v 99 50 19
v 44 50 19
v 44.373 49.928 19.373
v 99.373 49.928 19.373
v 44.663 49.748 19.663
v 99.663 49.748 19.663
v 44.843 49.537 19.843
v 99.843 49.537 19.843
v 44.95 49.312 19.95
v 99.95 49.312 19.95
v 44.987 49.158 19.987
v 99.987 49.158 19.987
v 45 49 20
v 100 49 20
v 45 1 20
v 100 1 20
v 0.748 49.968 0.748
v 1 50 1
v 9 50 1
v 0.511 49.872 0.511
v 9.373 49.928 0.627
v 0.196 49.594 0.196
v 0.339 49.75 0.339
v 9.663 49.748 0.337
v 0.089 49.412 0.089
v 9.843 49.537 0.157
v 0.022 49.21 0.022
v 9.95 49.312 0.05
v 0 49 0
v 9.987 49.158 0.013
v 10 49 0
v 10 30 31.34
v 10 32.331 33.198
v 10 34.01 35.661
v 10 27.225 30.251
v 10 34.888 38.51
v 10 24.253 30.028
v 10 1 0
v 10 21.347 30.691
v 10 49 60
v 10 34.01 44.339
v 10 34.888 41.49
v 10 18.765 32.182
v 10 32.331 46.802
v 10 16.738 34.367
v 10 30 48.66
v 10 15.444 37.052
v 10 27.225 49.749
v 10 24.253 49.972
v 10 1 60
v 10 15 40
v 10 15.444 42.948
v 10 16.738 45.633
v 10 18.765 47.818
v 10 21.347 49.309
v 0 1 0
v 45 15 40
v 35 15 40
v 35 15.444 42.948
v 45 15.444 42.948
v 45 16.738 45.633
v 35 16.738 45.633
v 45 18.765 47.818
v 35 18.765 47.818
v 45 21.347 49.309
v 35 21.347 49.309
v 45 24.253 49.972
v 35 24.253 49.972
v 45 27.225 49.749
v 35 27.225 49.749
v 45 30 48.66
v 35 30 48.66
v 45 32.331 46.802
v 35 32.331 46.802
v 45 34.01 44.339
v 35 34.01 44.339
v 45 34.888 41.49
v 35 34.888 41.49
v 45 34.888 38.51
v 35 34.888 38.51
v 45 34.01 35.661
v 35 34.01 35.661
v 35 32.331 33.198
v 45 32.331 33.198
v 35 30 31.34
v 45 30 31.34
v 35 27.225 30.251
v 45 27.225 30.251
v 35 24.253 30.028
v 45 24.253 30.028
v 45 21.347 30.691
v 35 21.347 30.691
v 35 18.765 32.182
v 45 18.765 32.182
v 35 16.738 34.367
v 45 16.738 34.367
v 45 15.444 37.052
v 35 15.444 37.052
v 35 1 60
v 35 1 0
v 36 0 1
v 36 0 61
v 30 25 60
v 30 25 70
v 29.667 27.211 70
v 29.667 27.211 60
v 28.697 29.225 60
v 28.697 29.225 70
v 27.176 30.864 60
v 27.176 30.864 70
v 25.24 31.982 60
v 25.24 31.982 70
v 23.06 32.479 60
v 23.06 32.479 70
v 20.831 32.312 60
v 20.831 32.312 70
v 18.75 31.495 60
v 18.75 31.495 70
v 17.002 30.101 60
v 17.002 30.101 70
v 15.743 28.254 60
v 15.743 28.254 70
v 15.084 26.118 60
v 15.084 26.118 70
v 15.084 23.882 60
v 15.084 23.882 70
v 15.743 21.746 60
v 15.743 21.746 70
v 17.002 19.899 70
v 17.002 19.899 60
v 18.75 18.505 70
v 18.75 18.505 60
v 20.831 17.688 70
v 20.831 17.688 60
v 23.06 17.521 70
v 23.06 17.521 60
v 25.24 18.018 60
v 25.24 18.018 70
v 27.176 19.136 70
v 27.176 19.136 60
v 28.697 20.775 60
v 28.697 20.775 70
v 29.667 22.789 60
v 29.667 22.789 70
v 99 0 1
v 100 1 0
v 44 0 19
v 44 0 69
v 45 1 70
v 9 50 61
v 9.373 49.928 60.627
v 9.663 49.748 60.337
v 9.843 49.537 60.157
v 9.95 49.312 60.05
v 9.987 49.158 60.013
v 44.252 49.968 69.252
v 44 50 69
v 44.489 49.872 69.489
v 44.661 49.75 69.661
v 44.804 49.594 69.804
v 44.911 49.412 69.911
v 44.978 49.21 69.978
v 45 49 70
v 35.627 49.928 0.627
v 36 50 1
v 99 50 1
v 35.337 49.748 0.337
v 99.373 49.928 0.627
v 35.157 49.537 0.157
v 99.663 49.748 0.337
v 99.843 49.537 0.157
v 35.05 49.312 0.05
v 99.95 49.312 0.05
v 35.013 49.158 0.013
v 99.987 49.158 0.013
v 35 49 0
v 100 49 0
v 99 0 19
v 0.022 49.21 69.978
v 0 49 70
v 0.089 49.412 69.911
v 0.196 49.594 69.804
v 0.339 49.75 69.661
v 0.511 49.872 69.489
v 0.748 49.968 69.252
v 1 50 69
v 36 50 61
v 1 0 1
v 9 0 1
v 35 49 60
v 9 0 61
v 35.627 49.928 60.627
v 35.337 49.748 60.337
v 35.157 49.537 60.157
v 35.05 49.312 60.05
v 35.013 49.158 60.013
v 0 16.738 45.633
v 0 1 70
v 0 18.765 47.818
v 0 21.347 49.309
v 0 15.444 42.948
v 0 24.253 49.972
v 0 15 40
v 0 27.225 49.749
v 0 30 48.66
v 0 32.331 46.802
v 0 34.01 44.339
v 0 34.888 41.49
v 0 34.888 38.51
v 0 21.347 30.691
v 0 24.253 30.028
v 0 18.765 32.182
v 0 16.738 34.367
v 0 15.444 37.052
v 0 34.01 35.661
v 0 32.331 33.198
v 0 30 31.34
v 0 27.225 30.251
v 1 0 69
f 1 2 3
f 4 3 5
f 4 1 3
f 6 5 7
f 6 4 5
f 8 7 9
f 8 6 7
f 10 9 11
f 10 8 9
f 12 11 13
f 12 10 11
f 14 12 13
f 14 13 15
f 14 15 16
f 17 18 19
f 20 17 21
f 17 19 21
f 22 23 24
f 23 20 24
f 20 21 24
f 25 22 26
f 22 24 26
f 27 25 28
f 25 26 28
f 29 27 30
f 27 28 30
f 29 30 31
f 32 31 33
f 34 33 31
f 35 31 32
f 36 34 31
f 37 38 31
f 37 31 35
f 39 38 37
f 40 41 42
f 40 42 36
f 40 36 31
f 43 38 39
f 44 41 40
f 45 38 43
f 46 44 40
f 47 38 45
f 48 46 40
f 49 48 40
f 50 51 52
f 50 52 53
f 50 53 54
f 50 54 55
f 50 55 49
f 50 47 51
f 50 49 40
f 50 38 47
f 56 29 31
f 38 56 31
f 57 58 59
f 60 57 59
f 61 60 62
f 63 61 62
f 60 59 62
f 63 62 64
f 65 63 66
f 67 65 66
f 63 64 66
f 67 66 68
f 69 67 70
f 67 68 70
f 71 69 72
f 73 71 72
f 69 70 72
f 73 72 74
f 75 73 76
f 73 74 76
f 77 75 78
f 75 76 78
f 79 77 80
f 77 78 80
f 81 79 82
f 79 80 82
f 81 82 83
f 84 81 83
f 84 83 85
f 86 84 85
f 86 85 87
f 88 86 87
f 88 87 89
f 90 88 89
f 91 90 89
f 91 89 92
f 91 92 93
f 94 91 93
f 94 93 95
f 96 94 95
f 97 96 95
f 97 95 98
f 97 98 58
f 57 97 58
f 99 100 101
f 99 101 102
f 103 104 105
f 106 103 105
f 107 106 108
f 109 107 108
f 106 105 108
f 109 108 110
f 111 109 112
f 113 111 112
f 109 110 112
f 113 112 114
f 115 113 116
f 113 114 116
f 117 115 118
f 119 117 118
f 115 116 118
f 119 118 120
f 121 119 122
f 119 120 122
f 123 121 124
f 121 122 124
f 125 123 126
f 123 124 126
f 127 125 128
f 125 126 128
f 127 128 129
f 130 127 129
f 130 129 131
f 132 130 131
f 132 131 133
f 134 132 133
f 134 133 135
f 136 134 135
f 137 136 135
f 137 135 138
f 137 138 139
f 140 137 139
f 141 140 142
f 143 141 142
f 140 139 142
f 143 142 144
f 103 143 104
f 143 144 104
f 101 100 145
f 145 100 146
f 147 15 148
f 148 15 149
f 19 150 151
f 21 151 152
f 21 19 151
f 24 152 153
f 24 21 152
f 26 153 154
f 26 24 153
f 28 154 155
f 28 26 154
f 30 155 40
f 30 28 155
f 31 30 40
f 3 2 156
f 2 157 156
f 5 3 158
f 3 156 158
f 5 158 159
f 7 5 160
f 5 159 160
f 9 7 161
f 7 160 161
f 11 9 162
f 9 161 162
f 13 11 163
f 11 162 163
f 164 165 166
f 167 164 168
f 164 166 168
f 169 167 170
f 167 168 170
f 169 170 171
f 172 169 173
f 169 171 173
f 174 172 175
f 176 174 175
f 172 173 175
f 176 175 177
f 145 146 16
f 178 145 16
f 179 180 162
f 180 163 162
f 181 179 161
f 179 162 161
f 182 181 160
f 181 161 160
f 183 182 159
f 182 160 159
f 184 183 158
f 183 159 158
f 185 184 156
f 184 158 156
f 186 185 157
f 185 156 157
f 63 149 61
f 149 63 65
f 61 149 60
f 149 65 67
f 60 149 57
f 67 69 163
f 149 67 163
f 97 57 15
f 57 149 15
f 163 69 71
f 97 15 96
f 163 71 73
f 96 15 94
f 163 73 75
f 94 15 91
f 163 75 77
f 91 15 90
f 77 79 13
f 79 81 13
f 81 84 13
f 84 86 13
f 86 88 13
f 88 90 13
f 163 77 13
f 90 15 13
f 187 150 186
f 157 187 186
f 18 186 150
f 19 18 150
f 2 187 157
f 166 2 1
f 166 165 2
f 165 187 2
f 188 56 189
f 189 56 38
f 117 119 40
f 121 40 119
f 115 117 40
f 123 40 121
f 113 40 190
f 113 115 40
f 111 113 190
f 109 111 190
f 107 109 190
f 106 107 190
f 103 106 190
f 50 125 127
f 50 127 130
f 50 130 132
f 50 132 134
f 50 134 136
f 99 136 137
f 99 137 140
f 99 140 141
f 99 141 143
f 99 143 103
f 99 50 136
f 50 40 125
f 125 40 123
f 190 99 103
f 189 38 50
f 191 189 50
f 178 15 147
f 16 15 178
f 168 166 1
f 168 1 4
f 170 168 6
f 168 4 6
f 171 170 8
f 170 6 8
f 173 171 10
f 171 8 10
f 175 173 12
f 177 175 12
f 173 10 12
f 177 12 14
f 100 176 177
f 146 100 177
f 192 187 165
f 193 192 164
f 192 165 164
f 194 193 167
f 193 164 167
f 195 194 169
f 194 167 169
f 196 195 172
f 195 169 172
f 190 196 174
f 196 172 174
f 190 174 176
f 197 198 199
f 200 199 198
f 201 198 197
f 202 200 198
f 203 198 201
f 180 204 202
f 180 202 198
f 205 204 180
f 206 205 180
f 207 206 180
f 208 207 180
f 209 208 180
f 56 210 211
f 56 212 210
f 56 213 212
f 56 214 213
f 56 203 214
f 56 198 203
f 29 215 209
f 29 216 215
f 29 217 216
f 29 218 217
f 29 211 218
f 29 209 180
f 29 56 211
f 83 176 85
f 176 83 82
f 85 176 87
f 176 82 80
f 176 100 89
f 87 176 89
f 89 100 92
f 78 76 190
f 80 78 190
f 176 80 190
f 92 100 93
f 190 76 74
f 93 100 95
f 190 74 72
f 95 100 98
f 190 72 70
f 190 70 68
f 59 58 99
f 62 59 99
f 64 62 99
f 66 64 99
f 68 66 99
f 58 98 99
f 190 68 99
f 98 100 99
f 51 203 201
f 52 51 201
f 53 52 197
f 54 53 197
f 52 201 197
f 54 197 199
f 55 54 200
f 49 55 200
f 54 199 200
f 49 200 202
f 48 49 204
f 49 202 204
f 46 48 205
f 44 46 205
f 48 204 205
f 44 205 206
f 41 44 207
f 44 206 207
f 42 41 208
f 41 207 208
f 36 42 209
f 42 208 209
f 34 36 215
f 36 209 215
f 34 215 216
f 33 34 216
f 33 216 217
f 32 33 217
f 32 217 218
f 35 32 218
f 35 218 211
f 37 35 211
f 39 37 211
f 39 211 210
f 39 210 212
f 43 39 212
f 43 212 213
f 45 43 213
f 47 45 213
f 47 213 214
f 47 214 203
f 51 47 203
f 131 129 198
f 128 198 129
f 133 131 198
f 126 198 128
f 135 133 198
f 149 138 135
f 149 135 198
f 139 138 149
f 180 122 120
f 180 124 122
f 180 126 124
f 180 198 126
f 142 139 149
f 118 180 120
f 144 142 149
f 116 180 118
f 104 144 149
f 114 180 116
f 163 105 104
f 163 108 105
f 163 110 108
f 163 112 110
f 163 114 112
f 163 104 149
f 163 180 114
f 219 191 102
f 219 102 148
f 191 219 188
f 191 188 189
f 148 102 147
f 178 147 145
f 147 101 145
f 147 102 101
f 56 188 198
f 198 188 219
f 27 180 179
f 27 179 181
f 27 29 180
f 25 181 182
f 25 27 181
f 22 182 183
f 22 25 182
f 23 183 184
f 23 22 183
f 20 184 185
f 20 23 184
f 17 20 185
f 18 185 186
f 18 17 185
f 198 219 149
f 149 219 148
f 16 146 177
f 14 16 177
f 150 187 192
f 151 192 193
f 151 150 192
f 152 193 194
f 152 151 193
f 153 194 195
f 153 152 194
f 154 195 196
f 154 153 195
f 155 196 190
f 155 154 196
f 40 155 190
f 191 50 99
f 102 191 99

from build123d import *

# Parameters (mm, degrees)
F0_W     = 100
F0_H     = 50
F1_DEPTH = 20
F2_W     = 45
F2_H     = 50
F3_DEPTH = 50
F4_W     = 25
F4_H     = 60
F5_DEPTH = 50.001
F6_R     = 10
F7_DEPTH = 100.001
F8_R     = 7.5
F9_DEPTH = 10
F10_SIZE = 1
F11_R    = 1


with BuildPart() as f1:
    # F0 (on Top) → F1 (new body)
    with BuildSketch(Plane.XY):
        with Locations((50, 25)):
            Rectangle(F0_W, F0_H)
    extrude(amount=F1_DEPTH)

    # F2 (on face) → F3 (join)
    with BuildSketch(Plane.XY.offset(20)):
        with Locations((22.5, 25)):
            Rectangle(F2_W, F2_H)
    extrude(amount=F3_DEPTH)

    # F4 (on face) → F5 (cut, through all)
    with BuildSketch(Plane.XZ):
        with Locations((22.5, 30)):
            Rectangle(F4_W, F4_H)
    extrude(amount=-F5_DEPTH, mode=Mode.SUBTRACT)

    # F6 (on face) → F7 (cut, through all)
    with BuildSketch(Plane(origin=(0, 0, 0), x_dir=(0, -1, 0), z_dir=(-1, 0, 0))):
        with Locations((-25, 40)):
            Circle(F6_R)
    extrude(amount=-F7_DEPTH, mode=Mode.SUBTRACT)

    # F8 (on face) → F9 (cut, through all)
    with BuildSketch(Plane.XY.offset(70)):
        with Locations((22.5, 25)):
            Circle(F8_R)
    extrude(amount=-F9_DEPTH, mode=Mode.SUBTRACT)

    # F10
    f10_edges = [f1.edges().sort_by_distance(p)[0] for p in [
        (5, 0, 0),
        (0, 0, 35),
        (45, 0, 45),
        (22.5, 0, 70),
        (10, 0, 30),
        (22.5, 0, 60),
        (35, 0, 30),
        (67.5, 0, 0),
        (72.5, 0, 20),
        (100, 0, 10),
    ]]
    chamfer(f10_edges, length=F10_SIZE)

    # F11
    f11_edges = [f1.edges().sort_by_distance(p)[0] for p in [
        (0, 50, 35),
        (22.5, 50, 70),
        (45, 50, 45),
        (72.5, 50, 20),
        (100, 50, 10),
        (67.5, 50, 0),
        (35, 50, 30),
        (22.5, 50, 60),
        (10, 50, 30),
        (5, 50, 0),
    ]]
    fillet(f11_edges, radius=F11_R)


solid = f1.part
